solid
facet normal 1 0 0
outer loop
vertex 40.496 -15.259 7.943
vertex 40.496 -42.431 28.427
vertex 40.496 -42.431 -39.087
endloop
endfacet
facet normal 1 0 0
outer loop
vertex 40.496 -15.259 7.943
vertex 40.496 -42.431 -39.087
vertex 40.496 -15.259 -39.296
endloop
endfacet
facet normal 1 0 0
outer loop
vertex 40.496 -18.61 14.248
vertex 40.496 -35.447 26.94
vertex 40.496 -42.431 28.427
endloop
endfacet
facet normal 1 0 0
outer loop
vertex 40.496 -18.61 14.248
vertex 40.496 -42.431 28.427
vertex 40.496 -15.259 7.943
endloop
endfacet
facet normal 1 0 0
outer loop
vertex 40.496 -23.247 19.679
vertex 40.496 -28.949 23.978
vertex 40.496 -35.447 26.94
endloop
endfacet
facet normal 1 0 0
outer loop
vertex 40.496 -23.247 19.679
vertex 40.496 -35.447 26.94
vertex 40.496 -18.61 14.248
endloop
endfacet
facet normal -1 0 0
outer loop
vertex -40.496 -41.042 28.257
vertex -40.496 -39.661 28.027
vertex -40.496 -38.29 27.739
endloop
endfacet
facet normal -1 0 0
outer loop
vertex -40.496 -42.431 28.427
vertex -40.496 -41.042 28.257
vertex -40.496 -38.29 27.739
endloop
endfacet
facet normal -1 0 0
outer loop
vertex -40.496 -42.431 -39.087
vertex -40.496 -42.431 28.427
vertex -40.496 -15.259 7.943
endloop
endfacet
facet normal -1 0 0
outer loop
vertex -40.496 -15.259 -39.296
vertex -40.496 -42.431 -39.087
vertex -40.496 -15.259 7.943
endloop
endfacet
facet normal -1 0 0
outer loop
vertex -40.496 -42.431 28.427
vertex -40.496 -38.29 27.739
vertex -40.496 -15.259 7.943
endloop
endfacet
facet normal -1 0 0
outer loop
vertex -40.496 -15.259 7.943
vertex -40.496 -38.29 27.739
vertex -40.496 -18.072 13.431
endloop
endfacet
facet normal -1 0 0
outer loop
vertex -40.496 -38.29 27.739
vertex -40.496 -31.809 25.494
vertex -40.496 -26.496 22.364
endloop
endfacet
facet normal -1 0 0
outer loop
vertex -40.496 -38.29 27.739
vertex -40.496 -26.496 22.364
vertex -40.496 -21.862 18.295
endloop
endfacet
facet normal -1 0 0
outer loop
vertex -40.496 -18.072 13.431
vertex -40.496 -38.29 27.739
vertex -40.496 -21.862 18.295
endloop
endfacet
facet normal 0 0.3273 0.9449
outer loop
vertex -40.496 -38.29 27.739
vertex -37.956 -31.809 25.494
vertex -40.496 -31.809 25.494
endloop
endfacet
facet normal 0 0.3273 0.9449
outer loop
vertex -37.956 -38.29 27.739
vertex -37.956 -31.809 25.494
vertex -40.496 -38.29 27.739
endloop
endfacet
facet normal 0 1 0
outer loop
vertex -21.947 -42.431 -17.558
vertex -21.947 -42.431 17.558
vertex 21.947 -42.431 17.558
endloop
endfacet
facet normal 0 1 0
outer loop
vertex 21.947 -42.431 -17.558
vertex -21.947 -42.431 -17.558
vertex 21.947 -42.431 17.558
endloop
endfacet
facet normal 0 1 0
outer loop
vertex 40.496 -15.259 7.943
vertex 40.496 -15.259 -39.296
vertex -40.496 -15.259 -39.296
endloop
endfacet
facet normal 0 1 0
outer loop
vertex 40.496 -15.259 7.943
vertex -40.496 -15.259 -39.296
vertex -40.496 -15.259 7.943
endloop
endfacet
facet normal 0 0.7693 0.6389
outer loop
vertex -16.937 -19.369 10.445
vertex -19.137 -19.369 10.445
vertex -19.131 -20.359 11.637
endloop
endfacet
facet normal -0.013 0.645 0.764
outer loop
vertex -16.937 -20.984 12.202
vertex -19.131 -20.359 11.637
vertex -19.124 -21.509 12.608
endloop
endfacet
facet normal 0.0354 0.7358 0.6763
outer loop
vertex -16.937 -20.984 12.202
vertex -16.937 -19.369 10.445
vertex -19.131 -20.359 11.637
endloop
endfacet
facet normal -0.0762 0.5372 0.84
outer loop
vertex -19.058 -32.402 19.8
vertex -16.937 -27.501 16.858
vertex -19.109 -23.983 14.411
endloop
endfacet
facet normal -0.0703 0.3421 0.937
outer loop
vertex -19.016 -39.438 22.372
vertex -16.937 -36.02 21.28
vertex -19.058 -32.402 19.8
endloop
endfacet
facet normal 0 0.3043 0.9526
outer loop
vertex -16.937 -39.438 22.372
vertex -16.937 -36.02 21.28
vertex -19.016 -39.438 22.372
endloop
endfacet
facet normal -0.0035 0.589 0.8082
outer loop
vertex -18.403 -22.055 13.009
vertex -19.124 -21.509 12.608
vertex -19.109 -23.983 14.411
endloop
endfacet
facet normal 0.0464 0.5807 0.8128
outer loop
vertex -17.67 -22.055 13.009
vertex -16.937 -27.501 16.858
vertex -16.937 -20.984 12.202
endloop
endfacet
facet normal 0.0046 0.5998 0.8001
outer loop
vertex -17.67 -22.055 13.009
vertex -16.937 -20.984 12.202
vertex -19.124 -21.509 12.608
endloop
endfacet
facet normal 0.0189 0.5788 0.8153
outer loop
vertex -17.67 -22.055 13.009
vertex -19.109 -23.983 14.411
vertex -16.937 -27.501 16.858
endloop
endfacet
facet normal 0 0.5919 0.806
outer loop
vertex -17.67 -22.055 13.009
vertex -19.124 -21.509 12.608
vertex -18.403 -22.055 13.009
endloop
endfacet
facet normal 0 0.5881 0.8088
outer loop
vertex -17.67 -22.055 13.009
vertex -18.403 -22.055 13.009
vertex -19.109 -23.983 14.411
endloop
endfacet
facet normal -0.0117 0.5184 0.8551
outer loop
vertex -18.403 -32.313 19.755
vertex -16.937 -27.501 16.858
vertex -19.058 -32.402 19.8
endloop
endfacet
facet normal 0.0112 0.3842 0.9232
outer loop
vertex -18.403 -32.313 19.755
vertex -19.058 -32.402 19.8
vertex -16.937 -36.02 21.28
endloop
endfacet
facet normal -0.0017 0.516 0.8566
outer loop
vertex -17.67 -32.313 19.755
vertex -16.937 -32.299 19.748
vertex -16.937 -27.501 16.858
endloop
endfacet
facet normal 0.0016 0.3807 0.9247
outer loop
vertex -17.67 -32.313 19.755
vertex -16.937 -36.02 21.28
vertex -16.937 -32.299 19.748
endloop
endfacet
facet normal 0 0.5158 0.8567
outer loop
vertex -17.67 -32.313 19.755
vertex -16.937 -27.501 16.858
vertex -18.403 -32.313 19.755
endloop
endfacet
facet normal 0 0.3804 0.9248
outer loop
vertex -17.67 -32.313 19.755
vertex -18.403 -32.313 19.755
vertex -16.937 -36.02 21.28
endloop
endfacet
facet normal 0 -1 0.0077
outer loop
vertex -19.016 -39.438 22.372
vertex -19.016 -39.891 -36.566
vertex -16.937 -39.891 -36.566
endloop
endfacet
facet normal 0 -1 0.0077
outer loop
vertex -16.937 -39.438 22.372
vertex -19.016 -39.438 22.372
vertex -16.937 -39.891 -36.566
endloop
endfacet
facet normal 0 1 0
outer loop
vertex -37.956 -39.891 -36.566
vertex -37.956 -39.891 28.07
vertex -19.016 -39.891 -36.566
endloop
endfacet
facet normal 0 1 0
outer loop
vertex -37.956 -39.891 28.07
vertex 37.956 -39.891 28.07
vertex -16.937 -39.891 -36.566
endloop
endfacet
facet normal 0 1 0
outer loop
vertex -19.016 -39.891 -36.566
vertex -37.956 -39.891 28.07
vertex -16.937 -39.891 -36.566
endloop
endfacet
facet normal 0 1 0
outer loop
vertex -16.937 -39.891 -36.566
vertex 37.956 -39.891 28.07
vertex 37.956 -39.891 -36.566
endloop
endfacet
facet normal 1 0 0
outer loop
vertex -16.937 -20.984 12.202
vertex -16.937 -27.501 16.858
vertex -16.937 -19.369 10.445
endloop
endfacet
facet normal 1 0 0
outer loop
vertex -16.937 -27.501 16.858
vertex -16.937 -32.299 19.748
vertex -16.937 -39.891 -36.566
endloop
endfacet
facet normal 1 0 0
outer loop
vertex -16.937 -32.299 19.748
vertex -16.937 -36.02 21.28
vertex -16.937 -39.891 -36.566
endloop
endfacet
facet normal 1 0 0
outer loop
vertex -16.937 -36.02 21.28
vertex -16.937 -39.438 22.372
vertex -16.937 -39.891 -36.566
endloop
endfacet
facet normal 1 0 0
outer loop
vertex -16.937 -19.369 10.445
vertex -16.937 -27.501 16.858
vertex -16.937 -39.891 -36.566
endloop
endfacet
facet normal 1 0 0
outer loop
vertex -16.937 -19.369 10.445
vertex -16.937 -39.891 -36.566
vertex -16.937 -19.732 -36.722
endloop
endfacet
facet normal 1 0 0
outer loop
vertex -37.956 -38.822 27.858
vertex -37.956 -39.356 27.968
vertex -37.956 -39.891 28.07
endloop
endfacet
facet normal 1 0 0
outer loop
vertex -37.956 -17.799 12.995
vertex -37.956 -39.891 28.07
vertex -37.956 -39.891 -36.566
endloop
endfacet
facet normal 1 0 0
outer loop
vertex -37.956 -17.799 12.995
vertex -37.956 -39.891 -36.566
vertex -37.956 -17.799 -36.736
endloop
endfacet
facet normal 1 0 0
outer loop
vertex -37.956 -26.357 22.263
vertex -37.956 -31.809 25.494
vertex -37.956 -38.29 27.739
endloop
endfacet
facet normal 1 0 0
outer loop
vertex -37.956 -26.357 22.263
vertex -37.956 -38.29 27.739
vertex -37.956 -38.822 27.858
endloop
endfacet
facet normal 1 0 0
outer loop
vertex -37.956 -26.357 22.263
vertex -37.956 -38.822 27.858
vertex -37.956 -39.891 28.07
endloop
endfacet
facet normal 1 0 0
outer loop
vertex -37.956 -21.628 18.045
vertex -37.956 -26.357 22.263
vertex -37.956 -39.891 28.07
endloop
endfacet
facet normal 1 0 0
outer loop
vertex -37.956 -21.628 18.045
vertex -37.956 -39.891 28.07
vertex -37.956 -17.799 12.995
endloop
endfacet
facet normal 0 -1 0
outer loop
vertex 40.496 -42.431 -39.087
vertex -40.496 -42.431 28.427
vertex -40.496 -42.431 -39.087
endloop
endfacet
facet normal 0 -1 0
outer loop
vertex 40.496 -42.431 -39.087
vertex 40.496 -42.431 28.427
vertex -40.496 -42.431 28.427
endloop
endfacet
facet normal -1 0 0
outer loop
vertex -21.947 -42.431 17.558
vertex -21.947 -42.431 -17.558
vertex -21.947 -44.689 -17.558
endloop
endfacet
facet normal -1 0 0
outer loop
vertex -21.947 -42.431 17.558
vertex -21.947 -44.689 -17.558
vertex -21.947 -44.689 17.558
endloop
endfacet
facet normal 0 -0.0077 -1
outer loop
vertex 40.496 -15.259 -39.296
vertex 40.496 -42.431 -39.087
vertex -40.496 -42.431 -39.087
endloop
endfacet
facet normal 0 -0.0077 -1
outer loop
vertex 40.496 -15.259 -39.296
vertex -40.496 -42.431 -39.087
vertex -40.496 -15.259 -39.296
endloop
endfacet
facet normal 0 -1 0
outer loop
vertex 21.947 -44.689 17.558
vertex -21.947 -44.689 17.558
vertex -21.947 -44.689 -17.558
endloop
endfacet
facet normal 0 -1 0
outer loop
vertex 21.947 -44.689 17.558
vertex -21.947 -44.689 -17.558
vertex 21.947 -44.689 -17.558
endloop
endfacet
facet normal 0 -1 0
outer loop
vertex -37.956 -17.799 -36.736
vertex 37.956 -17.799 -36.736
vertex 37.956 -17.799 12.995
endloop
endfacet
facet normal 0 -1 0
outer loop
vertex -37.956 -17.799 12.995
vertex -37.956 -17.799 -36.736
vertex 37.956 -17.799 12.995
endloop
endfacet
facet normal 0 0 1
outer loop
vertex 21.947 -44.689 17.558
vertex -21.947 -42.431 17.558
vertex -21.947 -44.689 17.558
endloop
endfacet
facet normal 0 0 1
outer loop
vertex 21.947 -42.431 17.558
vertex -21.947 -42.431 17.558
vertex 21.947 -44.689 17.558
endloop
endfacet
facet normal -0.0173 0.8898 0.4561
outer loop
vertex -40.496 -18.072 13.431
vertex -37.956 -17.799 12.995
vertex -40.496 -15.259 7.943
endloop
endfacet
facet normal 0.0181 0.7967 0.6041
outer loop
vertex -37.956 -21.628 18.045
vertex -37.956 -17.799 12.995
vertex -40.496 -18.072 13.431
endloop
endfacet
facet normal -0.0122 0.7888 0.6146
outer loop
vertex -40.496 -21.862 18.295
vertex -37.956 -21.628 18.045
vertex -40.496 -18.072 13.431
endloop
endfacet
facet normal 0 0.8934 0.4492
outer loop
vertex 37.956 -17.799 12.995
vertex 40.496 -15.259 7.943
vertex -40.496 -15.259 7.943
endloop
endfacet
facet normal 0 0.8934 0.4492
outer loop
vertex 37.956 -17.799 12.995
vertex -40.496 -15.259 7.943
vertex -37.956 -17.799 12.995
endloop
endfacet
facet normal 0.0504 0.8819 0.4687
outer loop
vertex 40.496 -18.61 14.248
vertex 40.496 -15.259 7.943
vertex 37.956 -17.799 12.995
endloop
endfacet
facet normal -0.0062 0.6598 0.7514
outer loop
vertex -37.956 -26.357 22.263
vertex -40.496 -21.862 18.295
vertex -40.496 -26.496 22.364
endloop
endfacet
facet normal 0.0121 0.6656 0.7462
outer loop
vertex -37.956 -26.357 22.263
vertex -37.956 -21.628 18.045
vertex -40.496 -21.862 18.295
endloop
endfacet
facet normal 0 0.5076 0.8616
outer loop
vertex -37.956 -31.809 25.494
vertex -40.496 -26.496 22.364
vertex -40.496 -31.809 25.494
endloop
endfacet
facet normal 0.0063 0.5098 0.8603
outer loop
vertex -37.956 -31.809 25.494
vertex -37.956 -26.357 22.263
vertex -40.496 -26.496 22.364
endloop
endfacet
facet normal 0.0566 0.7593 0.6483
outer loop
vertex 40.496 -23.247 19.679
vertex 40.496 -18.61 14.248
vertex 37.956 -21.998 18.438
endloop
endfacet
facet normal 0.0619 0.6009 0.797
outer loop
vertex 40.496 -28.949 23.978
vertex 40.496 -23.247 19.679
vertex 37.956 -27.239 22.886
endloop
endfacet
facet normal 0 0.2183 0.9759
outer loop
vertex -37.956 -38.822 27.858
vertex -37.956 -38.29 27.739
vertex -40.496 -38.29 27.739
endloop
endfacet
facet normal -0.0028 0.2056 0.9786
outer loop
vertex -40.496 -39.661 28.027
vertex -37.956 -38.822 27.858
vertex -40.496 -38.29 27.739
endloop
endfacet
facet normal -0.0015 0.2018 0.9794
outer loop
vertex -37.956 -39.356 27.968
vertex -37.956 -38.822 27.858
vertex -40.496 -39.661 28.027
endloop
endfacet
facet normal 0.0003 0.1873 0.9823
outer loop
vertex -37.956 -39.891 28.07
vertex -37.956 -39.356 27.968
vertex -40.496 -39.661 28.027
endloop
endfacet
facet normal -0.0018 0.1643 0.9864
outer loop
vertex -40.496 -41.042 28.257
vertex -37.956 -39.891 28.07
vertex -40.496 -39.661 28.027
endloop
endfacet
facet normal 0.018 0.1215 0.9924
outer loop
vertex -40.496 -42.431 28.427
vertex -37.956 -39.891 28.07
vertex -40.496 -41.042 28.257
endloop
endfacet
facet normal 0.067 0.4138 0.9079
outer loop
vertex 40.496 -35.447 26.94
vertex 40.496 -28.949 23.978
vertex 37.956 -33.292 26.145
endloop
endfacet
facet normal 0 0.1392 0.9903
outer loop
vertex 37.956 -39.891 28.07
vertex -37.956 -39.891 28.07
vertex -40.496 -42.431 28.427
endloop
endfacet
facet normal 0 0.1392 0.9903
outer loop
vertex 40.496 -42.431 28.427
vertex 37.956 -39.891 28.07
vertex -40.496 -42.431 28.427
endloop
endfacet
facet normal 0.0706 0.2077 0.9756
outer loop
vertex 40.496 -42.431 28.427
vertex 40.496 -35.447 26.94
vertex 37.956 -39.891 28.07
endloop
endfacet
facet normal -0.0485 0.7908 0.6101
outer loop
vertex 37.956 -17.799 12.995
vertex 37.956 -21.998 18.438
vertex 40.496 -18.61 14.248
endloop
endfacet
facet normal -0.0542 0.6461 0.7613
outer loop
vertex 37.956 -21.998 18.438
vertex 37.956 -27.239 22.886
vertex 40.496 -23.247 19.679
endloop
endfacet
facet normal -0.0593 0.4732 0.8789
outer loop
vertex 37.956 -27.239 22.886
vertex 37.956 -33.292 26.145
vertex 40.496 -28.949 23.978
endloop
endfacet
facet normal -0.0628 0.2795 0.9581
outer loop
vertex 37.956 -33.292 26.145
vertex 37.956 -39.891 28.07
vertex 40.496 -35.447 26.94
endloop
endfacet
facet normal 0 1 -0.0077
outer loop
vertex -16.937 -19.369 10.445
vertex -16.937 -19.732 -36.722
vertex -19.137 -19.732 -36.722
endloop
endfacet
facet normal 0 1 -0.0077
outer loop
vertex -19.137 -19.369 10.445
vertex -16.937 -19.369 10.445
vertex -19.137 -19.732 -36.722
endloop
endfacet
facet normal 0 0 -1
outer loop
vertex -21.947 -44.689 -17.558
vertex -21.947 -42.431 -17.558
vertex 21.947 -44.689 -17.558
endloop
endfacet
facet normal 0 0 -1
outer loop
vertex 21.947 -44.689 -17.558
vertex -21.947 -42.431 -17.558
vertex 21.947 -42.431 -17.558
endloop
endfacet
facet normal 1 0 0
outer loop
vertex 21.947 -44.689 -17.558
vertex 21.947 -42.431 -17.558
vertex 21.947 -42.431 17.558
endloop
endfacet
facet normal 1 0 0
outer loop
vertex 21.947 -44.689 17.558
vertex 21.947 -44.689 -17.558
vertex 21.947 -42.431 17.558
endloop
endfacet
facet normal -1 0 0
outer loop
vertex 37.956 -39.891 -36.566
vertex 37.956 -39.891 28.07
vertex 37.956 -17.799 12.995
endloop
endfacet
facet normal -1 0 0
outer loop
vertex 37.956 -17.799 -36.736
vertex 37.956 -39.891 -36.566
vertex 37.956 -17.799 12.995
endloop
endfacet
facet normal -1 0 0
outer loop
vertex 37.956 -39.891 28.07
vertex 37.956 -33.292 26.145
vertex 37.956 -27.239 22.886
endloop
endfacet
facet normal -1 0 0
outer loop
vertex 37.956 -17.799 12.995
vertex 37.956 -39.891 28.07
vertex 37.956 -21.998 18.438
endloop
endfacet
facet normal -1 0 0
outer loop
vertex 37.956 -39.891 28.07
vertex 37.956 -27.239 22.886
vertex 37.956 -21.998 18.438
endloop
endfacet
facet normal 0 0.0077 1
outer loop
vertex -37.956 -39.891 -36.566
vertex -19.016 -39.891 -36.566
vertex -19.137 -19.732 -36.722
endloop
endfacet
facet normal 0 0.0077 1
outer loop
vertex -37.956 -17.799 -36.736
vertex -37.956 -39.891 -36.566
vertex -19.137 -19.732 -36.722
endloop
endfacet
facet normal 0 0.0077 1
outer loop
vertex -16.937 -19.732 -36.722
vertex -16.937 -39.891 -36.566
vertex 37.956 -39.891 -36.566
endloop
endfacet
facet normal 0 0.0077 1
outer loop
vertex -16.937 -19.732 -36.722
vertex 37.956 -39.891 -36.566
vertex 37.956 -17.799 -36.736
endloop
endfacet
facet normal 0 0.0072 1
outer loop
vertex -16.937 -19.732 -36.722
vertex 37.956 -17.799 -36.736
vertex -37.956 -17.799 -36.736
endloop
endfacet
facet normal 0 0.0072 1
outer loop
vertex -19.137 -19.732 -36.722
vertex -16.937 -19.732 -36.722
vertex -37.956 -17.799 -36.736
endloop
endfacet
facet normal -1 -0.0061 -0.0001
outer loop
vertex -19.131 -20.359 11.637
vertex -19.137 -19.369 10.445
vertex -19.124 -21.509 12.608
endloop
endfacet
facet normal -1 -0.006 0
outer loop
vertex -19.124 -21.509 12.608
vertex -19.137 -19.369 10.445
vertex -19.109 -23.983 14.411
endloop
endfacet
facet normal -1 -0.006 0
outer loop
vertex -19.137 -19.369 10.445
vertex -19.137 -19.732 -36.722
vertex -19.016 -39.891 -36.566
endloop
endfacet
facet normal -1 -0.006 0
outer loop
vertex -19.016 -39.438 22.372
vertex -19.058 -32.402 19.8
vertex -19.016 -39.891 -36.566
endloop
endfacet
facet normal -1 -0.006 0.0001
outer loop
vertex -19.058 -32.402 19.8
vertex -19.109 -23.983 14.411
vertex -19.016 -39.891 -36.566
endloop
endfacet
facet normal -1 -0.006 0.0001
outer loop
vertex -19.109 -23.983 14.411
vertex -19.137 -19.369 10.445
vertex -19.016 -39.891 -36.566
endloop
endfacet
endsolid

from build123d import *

# Parameters (mm, degrees)
F1_DEPTH  = 40.4962673783
F2_T      = -2.54
F4_DEPTH  = 64.6499544382
F6_DEPTH  = 25.4
F8_DEPTH  = 7.8383367509
F9_W      = 43.894559145
F9_H      = 35.1156592369
F10_DEPTH = 2.2577764466


with BuildPart() as f1:
    # F0 (on Right) → F1 (new body, symmetric)
    with BuildSketch(Plane.YZ):
        with BuildLine():
            Line((-42.4313992262, 28.4269750118), (-42.4313992262, -39.0870273113))
            Line((-42.4313992262, -39.0870273113), (-15.2585804462, -39.2960458994))
            Line((-15.2585804462, -39.2960458994), (-15.2585804462, 7.9428553581))
            ThreePointArc((-15.2585804462, 7.9428553581), (-25.9810477869, 21.9840229631), (-42.4313992262, 28.4269750118))
        make_face()
    extrude(amount=F1_DEPTH, both=True)

    # F2
    f2_openings = [f1.faces().sort_by_distance(p)[0] for p in [
        (0, -25.981048, 21.984023),
    ]]
    offset(amount=F2_T, openings=f2_openings)

    # F3 (on face) → F4 (join)
    with BuildSketch(Plane(origin=(0, -0.2836201163, -36.8711610518), x_dir=(1, 0, 0), z_dir=(0, 0.0076919662, 0.9999704164))):
        Polygon((-16.9365108013, -19.4489490241), (-19.1369354725, -19.4489490241), (-19.0156064928, -39.6089508856), (-16.9365108013, -39.6089508856), align=None)
    extrude(amount=F4_DEPTH)

    # F5 (on face) → F6 (cut)
    with BuildSketch(Plane.YZ.offset(-16.9365108013)):
        with BuildLine():
            add(Edge.make_bspline(
                [(-19.3281353329, 15.7808138406), (-20.3699654407, 17.105653585), (-22.6926373922, 20.0592705848), (-29.2882953868, 24.9500093136), (-35.8627586326, 26.9872723021), (-39.3941139596, 28.0815515202)],
                knots=[0, 0, 0, 0, 0.2735167374, 0.6097823753, 1, 1, 1, 1], degree=3))
            Line((-19.3281353329, 15.7808138406), (-19.2347085037, 27.9264814666))
            Line((-19.2347085037, 27.9264814666), (-39.3941139596, 28.0815515202))
        make_face()
    extrude(amount=-F6_DEPTH, mode=Mode.SUBTRACT)

    # F7 (on face) → F8 (cut)
    with BuildSketch(Plane.YZ.offset(-16.9365108013)):
        with BuildLine():
            add(Edge.make_bspline(
                [(-19.3691832665, 10.444503462), (-20.3236829035, 11.74977581), (-21.7640219838, 12.7860568934), (-32.4262033797, 20.6215228131), (-37.1055782084, 21.5614787411), (-39.4380341599, 22.3718409401)],
                knots=[0, 0, 0, 0, 0.2354146383, 0.6634532783, 1, 1, 1, 1], degree=3))
            Line((-19.3691832665, 10.444503462), (-19.3281353329, 15.7808138406))
            add(Edge.make_bspline(
                [(-19.3281353329, 15.7808138406), (-20.3699654407, 17.105653585), (-22.6926373922, 20.0592705848), (-29.2882953868, 24.9500093136), (-35.8627586326, 26.9872723021), (-39.3941139596, 28.0815515202)],
                knots=[0, 0, 0, 0, 0.2735167374, 0.6097823753, 1, 1, 1, 1], degree=3))
            Line((-39.3941139596, 28.0815515202), (-39.4380341599, 22.3718409401))
        make_face()
    extrude(amount=-F8_DEPTH, mode=Mode.SUBTRACT)


with BuildPart() as f10:
    # F9 (on face) → F10 (new body)
    with BuildSketch(Plane.XZ.offset(42.4313992262)):
        Rectangle(F9_W, F9_H)
    extrude(amount=F10_DEPTH)


solid = Compound([f1.part, f10.part])
